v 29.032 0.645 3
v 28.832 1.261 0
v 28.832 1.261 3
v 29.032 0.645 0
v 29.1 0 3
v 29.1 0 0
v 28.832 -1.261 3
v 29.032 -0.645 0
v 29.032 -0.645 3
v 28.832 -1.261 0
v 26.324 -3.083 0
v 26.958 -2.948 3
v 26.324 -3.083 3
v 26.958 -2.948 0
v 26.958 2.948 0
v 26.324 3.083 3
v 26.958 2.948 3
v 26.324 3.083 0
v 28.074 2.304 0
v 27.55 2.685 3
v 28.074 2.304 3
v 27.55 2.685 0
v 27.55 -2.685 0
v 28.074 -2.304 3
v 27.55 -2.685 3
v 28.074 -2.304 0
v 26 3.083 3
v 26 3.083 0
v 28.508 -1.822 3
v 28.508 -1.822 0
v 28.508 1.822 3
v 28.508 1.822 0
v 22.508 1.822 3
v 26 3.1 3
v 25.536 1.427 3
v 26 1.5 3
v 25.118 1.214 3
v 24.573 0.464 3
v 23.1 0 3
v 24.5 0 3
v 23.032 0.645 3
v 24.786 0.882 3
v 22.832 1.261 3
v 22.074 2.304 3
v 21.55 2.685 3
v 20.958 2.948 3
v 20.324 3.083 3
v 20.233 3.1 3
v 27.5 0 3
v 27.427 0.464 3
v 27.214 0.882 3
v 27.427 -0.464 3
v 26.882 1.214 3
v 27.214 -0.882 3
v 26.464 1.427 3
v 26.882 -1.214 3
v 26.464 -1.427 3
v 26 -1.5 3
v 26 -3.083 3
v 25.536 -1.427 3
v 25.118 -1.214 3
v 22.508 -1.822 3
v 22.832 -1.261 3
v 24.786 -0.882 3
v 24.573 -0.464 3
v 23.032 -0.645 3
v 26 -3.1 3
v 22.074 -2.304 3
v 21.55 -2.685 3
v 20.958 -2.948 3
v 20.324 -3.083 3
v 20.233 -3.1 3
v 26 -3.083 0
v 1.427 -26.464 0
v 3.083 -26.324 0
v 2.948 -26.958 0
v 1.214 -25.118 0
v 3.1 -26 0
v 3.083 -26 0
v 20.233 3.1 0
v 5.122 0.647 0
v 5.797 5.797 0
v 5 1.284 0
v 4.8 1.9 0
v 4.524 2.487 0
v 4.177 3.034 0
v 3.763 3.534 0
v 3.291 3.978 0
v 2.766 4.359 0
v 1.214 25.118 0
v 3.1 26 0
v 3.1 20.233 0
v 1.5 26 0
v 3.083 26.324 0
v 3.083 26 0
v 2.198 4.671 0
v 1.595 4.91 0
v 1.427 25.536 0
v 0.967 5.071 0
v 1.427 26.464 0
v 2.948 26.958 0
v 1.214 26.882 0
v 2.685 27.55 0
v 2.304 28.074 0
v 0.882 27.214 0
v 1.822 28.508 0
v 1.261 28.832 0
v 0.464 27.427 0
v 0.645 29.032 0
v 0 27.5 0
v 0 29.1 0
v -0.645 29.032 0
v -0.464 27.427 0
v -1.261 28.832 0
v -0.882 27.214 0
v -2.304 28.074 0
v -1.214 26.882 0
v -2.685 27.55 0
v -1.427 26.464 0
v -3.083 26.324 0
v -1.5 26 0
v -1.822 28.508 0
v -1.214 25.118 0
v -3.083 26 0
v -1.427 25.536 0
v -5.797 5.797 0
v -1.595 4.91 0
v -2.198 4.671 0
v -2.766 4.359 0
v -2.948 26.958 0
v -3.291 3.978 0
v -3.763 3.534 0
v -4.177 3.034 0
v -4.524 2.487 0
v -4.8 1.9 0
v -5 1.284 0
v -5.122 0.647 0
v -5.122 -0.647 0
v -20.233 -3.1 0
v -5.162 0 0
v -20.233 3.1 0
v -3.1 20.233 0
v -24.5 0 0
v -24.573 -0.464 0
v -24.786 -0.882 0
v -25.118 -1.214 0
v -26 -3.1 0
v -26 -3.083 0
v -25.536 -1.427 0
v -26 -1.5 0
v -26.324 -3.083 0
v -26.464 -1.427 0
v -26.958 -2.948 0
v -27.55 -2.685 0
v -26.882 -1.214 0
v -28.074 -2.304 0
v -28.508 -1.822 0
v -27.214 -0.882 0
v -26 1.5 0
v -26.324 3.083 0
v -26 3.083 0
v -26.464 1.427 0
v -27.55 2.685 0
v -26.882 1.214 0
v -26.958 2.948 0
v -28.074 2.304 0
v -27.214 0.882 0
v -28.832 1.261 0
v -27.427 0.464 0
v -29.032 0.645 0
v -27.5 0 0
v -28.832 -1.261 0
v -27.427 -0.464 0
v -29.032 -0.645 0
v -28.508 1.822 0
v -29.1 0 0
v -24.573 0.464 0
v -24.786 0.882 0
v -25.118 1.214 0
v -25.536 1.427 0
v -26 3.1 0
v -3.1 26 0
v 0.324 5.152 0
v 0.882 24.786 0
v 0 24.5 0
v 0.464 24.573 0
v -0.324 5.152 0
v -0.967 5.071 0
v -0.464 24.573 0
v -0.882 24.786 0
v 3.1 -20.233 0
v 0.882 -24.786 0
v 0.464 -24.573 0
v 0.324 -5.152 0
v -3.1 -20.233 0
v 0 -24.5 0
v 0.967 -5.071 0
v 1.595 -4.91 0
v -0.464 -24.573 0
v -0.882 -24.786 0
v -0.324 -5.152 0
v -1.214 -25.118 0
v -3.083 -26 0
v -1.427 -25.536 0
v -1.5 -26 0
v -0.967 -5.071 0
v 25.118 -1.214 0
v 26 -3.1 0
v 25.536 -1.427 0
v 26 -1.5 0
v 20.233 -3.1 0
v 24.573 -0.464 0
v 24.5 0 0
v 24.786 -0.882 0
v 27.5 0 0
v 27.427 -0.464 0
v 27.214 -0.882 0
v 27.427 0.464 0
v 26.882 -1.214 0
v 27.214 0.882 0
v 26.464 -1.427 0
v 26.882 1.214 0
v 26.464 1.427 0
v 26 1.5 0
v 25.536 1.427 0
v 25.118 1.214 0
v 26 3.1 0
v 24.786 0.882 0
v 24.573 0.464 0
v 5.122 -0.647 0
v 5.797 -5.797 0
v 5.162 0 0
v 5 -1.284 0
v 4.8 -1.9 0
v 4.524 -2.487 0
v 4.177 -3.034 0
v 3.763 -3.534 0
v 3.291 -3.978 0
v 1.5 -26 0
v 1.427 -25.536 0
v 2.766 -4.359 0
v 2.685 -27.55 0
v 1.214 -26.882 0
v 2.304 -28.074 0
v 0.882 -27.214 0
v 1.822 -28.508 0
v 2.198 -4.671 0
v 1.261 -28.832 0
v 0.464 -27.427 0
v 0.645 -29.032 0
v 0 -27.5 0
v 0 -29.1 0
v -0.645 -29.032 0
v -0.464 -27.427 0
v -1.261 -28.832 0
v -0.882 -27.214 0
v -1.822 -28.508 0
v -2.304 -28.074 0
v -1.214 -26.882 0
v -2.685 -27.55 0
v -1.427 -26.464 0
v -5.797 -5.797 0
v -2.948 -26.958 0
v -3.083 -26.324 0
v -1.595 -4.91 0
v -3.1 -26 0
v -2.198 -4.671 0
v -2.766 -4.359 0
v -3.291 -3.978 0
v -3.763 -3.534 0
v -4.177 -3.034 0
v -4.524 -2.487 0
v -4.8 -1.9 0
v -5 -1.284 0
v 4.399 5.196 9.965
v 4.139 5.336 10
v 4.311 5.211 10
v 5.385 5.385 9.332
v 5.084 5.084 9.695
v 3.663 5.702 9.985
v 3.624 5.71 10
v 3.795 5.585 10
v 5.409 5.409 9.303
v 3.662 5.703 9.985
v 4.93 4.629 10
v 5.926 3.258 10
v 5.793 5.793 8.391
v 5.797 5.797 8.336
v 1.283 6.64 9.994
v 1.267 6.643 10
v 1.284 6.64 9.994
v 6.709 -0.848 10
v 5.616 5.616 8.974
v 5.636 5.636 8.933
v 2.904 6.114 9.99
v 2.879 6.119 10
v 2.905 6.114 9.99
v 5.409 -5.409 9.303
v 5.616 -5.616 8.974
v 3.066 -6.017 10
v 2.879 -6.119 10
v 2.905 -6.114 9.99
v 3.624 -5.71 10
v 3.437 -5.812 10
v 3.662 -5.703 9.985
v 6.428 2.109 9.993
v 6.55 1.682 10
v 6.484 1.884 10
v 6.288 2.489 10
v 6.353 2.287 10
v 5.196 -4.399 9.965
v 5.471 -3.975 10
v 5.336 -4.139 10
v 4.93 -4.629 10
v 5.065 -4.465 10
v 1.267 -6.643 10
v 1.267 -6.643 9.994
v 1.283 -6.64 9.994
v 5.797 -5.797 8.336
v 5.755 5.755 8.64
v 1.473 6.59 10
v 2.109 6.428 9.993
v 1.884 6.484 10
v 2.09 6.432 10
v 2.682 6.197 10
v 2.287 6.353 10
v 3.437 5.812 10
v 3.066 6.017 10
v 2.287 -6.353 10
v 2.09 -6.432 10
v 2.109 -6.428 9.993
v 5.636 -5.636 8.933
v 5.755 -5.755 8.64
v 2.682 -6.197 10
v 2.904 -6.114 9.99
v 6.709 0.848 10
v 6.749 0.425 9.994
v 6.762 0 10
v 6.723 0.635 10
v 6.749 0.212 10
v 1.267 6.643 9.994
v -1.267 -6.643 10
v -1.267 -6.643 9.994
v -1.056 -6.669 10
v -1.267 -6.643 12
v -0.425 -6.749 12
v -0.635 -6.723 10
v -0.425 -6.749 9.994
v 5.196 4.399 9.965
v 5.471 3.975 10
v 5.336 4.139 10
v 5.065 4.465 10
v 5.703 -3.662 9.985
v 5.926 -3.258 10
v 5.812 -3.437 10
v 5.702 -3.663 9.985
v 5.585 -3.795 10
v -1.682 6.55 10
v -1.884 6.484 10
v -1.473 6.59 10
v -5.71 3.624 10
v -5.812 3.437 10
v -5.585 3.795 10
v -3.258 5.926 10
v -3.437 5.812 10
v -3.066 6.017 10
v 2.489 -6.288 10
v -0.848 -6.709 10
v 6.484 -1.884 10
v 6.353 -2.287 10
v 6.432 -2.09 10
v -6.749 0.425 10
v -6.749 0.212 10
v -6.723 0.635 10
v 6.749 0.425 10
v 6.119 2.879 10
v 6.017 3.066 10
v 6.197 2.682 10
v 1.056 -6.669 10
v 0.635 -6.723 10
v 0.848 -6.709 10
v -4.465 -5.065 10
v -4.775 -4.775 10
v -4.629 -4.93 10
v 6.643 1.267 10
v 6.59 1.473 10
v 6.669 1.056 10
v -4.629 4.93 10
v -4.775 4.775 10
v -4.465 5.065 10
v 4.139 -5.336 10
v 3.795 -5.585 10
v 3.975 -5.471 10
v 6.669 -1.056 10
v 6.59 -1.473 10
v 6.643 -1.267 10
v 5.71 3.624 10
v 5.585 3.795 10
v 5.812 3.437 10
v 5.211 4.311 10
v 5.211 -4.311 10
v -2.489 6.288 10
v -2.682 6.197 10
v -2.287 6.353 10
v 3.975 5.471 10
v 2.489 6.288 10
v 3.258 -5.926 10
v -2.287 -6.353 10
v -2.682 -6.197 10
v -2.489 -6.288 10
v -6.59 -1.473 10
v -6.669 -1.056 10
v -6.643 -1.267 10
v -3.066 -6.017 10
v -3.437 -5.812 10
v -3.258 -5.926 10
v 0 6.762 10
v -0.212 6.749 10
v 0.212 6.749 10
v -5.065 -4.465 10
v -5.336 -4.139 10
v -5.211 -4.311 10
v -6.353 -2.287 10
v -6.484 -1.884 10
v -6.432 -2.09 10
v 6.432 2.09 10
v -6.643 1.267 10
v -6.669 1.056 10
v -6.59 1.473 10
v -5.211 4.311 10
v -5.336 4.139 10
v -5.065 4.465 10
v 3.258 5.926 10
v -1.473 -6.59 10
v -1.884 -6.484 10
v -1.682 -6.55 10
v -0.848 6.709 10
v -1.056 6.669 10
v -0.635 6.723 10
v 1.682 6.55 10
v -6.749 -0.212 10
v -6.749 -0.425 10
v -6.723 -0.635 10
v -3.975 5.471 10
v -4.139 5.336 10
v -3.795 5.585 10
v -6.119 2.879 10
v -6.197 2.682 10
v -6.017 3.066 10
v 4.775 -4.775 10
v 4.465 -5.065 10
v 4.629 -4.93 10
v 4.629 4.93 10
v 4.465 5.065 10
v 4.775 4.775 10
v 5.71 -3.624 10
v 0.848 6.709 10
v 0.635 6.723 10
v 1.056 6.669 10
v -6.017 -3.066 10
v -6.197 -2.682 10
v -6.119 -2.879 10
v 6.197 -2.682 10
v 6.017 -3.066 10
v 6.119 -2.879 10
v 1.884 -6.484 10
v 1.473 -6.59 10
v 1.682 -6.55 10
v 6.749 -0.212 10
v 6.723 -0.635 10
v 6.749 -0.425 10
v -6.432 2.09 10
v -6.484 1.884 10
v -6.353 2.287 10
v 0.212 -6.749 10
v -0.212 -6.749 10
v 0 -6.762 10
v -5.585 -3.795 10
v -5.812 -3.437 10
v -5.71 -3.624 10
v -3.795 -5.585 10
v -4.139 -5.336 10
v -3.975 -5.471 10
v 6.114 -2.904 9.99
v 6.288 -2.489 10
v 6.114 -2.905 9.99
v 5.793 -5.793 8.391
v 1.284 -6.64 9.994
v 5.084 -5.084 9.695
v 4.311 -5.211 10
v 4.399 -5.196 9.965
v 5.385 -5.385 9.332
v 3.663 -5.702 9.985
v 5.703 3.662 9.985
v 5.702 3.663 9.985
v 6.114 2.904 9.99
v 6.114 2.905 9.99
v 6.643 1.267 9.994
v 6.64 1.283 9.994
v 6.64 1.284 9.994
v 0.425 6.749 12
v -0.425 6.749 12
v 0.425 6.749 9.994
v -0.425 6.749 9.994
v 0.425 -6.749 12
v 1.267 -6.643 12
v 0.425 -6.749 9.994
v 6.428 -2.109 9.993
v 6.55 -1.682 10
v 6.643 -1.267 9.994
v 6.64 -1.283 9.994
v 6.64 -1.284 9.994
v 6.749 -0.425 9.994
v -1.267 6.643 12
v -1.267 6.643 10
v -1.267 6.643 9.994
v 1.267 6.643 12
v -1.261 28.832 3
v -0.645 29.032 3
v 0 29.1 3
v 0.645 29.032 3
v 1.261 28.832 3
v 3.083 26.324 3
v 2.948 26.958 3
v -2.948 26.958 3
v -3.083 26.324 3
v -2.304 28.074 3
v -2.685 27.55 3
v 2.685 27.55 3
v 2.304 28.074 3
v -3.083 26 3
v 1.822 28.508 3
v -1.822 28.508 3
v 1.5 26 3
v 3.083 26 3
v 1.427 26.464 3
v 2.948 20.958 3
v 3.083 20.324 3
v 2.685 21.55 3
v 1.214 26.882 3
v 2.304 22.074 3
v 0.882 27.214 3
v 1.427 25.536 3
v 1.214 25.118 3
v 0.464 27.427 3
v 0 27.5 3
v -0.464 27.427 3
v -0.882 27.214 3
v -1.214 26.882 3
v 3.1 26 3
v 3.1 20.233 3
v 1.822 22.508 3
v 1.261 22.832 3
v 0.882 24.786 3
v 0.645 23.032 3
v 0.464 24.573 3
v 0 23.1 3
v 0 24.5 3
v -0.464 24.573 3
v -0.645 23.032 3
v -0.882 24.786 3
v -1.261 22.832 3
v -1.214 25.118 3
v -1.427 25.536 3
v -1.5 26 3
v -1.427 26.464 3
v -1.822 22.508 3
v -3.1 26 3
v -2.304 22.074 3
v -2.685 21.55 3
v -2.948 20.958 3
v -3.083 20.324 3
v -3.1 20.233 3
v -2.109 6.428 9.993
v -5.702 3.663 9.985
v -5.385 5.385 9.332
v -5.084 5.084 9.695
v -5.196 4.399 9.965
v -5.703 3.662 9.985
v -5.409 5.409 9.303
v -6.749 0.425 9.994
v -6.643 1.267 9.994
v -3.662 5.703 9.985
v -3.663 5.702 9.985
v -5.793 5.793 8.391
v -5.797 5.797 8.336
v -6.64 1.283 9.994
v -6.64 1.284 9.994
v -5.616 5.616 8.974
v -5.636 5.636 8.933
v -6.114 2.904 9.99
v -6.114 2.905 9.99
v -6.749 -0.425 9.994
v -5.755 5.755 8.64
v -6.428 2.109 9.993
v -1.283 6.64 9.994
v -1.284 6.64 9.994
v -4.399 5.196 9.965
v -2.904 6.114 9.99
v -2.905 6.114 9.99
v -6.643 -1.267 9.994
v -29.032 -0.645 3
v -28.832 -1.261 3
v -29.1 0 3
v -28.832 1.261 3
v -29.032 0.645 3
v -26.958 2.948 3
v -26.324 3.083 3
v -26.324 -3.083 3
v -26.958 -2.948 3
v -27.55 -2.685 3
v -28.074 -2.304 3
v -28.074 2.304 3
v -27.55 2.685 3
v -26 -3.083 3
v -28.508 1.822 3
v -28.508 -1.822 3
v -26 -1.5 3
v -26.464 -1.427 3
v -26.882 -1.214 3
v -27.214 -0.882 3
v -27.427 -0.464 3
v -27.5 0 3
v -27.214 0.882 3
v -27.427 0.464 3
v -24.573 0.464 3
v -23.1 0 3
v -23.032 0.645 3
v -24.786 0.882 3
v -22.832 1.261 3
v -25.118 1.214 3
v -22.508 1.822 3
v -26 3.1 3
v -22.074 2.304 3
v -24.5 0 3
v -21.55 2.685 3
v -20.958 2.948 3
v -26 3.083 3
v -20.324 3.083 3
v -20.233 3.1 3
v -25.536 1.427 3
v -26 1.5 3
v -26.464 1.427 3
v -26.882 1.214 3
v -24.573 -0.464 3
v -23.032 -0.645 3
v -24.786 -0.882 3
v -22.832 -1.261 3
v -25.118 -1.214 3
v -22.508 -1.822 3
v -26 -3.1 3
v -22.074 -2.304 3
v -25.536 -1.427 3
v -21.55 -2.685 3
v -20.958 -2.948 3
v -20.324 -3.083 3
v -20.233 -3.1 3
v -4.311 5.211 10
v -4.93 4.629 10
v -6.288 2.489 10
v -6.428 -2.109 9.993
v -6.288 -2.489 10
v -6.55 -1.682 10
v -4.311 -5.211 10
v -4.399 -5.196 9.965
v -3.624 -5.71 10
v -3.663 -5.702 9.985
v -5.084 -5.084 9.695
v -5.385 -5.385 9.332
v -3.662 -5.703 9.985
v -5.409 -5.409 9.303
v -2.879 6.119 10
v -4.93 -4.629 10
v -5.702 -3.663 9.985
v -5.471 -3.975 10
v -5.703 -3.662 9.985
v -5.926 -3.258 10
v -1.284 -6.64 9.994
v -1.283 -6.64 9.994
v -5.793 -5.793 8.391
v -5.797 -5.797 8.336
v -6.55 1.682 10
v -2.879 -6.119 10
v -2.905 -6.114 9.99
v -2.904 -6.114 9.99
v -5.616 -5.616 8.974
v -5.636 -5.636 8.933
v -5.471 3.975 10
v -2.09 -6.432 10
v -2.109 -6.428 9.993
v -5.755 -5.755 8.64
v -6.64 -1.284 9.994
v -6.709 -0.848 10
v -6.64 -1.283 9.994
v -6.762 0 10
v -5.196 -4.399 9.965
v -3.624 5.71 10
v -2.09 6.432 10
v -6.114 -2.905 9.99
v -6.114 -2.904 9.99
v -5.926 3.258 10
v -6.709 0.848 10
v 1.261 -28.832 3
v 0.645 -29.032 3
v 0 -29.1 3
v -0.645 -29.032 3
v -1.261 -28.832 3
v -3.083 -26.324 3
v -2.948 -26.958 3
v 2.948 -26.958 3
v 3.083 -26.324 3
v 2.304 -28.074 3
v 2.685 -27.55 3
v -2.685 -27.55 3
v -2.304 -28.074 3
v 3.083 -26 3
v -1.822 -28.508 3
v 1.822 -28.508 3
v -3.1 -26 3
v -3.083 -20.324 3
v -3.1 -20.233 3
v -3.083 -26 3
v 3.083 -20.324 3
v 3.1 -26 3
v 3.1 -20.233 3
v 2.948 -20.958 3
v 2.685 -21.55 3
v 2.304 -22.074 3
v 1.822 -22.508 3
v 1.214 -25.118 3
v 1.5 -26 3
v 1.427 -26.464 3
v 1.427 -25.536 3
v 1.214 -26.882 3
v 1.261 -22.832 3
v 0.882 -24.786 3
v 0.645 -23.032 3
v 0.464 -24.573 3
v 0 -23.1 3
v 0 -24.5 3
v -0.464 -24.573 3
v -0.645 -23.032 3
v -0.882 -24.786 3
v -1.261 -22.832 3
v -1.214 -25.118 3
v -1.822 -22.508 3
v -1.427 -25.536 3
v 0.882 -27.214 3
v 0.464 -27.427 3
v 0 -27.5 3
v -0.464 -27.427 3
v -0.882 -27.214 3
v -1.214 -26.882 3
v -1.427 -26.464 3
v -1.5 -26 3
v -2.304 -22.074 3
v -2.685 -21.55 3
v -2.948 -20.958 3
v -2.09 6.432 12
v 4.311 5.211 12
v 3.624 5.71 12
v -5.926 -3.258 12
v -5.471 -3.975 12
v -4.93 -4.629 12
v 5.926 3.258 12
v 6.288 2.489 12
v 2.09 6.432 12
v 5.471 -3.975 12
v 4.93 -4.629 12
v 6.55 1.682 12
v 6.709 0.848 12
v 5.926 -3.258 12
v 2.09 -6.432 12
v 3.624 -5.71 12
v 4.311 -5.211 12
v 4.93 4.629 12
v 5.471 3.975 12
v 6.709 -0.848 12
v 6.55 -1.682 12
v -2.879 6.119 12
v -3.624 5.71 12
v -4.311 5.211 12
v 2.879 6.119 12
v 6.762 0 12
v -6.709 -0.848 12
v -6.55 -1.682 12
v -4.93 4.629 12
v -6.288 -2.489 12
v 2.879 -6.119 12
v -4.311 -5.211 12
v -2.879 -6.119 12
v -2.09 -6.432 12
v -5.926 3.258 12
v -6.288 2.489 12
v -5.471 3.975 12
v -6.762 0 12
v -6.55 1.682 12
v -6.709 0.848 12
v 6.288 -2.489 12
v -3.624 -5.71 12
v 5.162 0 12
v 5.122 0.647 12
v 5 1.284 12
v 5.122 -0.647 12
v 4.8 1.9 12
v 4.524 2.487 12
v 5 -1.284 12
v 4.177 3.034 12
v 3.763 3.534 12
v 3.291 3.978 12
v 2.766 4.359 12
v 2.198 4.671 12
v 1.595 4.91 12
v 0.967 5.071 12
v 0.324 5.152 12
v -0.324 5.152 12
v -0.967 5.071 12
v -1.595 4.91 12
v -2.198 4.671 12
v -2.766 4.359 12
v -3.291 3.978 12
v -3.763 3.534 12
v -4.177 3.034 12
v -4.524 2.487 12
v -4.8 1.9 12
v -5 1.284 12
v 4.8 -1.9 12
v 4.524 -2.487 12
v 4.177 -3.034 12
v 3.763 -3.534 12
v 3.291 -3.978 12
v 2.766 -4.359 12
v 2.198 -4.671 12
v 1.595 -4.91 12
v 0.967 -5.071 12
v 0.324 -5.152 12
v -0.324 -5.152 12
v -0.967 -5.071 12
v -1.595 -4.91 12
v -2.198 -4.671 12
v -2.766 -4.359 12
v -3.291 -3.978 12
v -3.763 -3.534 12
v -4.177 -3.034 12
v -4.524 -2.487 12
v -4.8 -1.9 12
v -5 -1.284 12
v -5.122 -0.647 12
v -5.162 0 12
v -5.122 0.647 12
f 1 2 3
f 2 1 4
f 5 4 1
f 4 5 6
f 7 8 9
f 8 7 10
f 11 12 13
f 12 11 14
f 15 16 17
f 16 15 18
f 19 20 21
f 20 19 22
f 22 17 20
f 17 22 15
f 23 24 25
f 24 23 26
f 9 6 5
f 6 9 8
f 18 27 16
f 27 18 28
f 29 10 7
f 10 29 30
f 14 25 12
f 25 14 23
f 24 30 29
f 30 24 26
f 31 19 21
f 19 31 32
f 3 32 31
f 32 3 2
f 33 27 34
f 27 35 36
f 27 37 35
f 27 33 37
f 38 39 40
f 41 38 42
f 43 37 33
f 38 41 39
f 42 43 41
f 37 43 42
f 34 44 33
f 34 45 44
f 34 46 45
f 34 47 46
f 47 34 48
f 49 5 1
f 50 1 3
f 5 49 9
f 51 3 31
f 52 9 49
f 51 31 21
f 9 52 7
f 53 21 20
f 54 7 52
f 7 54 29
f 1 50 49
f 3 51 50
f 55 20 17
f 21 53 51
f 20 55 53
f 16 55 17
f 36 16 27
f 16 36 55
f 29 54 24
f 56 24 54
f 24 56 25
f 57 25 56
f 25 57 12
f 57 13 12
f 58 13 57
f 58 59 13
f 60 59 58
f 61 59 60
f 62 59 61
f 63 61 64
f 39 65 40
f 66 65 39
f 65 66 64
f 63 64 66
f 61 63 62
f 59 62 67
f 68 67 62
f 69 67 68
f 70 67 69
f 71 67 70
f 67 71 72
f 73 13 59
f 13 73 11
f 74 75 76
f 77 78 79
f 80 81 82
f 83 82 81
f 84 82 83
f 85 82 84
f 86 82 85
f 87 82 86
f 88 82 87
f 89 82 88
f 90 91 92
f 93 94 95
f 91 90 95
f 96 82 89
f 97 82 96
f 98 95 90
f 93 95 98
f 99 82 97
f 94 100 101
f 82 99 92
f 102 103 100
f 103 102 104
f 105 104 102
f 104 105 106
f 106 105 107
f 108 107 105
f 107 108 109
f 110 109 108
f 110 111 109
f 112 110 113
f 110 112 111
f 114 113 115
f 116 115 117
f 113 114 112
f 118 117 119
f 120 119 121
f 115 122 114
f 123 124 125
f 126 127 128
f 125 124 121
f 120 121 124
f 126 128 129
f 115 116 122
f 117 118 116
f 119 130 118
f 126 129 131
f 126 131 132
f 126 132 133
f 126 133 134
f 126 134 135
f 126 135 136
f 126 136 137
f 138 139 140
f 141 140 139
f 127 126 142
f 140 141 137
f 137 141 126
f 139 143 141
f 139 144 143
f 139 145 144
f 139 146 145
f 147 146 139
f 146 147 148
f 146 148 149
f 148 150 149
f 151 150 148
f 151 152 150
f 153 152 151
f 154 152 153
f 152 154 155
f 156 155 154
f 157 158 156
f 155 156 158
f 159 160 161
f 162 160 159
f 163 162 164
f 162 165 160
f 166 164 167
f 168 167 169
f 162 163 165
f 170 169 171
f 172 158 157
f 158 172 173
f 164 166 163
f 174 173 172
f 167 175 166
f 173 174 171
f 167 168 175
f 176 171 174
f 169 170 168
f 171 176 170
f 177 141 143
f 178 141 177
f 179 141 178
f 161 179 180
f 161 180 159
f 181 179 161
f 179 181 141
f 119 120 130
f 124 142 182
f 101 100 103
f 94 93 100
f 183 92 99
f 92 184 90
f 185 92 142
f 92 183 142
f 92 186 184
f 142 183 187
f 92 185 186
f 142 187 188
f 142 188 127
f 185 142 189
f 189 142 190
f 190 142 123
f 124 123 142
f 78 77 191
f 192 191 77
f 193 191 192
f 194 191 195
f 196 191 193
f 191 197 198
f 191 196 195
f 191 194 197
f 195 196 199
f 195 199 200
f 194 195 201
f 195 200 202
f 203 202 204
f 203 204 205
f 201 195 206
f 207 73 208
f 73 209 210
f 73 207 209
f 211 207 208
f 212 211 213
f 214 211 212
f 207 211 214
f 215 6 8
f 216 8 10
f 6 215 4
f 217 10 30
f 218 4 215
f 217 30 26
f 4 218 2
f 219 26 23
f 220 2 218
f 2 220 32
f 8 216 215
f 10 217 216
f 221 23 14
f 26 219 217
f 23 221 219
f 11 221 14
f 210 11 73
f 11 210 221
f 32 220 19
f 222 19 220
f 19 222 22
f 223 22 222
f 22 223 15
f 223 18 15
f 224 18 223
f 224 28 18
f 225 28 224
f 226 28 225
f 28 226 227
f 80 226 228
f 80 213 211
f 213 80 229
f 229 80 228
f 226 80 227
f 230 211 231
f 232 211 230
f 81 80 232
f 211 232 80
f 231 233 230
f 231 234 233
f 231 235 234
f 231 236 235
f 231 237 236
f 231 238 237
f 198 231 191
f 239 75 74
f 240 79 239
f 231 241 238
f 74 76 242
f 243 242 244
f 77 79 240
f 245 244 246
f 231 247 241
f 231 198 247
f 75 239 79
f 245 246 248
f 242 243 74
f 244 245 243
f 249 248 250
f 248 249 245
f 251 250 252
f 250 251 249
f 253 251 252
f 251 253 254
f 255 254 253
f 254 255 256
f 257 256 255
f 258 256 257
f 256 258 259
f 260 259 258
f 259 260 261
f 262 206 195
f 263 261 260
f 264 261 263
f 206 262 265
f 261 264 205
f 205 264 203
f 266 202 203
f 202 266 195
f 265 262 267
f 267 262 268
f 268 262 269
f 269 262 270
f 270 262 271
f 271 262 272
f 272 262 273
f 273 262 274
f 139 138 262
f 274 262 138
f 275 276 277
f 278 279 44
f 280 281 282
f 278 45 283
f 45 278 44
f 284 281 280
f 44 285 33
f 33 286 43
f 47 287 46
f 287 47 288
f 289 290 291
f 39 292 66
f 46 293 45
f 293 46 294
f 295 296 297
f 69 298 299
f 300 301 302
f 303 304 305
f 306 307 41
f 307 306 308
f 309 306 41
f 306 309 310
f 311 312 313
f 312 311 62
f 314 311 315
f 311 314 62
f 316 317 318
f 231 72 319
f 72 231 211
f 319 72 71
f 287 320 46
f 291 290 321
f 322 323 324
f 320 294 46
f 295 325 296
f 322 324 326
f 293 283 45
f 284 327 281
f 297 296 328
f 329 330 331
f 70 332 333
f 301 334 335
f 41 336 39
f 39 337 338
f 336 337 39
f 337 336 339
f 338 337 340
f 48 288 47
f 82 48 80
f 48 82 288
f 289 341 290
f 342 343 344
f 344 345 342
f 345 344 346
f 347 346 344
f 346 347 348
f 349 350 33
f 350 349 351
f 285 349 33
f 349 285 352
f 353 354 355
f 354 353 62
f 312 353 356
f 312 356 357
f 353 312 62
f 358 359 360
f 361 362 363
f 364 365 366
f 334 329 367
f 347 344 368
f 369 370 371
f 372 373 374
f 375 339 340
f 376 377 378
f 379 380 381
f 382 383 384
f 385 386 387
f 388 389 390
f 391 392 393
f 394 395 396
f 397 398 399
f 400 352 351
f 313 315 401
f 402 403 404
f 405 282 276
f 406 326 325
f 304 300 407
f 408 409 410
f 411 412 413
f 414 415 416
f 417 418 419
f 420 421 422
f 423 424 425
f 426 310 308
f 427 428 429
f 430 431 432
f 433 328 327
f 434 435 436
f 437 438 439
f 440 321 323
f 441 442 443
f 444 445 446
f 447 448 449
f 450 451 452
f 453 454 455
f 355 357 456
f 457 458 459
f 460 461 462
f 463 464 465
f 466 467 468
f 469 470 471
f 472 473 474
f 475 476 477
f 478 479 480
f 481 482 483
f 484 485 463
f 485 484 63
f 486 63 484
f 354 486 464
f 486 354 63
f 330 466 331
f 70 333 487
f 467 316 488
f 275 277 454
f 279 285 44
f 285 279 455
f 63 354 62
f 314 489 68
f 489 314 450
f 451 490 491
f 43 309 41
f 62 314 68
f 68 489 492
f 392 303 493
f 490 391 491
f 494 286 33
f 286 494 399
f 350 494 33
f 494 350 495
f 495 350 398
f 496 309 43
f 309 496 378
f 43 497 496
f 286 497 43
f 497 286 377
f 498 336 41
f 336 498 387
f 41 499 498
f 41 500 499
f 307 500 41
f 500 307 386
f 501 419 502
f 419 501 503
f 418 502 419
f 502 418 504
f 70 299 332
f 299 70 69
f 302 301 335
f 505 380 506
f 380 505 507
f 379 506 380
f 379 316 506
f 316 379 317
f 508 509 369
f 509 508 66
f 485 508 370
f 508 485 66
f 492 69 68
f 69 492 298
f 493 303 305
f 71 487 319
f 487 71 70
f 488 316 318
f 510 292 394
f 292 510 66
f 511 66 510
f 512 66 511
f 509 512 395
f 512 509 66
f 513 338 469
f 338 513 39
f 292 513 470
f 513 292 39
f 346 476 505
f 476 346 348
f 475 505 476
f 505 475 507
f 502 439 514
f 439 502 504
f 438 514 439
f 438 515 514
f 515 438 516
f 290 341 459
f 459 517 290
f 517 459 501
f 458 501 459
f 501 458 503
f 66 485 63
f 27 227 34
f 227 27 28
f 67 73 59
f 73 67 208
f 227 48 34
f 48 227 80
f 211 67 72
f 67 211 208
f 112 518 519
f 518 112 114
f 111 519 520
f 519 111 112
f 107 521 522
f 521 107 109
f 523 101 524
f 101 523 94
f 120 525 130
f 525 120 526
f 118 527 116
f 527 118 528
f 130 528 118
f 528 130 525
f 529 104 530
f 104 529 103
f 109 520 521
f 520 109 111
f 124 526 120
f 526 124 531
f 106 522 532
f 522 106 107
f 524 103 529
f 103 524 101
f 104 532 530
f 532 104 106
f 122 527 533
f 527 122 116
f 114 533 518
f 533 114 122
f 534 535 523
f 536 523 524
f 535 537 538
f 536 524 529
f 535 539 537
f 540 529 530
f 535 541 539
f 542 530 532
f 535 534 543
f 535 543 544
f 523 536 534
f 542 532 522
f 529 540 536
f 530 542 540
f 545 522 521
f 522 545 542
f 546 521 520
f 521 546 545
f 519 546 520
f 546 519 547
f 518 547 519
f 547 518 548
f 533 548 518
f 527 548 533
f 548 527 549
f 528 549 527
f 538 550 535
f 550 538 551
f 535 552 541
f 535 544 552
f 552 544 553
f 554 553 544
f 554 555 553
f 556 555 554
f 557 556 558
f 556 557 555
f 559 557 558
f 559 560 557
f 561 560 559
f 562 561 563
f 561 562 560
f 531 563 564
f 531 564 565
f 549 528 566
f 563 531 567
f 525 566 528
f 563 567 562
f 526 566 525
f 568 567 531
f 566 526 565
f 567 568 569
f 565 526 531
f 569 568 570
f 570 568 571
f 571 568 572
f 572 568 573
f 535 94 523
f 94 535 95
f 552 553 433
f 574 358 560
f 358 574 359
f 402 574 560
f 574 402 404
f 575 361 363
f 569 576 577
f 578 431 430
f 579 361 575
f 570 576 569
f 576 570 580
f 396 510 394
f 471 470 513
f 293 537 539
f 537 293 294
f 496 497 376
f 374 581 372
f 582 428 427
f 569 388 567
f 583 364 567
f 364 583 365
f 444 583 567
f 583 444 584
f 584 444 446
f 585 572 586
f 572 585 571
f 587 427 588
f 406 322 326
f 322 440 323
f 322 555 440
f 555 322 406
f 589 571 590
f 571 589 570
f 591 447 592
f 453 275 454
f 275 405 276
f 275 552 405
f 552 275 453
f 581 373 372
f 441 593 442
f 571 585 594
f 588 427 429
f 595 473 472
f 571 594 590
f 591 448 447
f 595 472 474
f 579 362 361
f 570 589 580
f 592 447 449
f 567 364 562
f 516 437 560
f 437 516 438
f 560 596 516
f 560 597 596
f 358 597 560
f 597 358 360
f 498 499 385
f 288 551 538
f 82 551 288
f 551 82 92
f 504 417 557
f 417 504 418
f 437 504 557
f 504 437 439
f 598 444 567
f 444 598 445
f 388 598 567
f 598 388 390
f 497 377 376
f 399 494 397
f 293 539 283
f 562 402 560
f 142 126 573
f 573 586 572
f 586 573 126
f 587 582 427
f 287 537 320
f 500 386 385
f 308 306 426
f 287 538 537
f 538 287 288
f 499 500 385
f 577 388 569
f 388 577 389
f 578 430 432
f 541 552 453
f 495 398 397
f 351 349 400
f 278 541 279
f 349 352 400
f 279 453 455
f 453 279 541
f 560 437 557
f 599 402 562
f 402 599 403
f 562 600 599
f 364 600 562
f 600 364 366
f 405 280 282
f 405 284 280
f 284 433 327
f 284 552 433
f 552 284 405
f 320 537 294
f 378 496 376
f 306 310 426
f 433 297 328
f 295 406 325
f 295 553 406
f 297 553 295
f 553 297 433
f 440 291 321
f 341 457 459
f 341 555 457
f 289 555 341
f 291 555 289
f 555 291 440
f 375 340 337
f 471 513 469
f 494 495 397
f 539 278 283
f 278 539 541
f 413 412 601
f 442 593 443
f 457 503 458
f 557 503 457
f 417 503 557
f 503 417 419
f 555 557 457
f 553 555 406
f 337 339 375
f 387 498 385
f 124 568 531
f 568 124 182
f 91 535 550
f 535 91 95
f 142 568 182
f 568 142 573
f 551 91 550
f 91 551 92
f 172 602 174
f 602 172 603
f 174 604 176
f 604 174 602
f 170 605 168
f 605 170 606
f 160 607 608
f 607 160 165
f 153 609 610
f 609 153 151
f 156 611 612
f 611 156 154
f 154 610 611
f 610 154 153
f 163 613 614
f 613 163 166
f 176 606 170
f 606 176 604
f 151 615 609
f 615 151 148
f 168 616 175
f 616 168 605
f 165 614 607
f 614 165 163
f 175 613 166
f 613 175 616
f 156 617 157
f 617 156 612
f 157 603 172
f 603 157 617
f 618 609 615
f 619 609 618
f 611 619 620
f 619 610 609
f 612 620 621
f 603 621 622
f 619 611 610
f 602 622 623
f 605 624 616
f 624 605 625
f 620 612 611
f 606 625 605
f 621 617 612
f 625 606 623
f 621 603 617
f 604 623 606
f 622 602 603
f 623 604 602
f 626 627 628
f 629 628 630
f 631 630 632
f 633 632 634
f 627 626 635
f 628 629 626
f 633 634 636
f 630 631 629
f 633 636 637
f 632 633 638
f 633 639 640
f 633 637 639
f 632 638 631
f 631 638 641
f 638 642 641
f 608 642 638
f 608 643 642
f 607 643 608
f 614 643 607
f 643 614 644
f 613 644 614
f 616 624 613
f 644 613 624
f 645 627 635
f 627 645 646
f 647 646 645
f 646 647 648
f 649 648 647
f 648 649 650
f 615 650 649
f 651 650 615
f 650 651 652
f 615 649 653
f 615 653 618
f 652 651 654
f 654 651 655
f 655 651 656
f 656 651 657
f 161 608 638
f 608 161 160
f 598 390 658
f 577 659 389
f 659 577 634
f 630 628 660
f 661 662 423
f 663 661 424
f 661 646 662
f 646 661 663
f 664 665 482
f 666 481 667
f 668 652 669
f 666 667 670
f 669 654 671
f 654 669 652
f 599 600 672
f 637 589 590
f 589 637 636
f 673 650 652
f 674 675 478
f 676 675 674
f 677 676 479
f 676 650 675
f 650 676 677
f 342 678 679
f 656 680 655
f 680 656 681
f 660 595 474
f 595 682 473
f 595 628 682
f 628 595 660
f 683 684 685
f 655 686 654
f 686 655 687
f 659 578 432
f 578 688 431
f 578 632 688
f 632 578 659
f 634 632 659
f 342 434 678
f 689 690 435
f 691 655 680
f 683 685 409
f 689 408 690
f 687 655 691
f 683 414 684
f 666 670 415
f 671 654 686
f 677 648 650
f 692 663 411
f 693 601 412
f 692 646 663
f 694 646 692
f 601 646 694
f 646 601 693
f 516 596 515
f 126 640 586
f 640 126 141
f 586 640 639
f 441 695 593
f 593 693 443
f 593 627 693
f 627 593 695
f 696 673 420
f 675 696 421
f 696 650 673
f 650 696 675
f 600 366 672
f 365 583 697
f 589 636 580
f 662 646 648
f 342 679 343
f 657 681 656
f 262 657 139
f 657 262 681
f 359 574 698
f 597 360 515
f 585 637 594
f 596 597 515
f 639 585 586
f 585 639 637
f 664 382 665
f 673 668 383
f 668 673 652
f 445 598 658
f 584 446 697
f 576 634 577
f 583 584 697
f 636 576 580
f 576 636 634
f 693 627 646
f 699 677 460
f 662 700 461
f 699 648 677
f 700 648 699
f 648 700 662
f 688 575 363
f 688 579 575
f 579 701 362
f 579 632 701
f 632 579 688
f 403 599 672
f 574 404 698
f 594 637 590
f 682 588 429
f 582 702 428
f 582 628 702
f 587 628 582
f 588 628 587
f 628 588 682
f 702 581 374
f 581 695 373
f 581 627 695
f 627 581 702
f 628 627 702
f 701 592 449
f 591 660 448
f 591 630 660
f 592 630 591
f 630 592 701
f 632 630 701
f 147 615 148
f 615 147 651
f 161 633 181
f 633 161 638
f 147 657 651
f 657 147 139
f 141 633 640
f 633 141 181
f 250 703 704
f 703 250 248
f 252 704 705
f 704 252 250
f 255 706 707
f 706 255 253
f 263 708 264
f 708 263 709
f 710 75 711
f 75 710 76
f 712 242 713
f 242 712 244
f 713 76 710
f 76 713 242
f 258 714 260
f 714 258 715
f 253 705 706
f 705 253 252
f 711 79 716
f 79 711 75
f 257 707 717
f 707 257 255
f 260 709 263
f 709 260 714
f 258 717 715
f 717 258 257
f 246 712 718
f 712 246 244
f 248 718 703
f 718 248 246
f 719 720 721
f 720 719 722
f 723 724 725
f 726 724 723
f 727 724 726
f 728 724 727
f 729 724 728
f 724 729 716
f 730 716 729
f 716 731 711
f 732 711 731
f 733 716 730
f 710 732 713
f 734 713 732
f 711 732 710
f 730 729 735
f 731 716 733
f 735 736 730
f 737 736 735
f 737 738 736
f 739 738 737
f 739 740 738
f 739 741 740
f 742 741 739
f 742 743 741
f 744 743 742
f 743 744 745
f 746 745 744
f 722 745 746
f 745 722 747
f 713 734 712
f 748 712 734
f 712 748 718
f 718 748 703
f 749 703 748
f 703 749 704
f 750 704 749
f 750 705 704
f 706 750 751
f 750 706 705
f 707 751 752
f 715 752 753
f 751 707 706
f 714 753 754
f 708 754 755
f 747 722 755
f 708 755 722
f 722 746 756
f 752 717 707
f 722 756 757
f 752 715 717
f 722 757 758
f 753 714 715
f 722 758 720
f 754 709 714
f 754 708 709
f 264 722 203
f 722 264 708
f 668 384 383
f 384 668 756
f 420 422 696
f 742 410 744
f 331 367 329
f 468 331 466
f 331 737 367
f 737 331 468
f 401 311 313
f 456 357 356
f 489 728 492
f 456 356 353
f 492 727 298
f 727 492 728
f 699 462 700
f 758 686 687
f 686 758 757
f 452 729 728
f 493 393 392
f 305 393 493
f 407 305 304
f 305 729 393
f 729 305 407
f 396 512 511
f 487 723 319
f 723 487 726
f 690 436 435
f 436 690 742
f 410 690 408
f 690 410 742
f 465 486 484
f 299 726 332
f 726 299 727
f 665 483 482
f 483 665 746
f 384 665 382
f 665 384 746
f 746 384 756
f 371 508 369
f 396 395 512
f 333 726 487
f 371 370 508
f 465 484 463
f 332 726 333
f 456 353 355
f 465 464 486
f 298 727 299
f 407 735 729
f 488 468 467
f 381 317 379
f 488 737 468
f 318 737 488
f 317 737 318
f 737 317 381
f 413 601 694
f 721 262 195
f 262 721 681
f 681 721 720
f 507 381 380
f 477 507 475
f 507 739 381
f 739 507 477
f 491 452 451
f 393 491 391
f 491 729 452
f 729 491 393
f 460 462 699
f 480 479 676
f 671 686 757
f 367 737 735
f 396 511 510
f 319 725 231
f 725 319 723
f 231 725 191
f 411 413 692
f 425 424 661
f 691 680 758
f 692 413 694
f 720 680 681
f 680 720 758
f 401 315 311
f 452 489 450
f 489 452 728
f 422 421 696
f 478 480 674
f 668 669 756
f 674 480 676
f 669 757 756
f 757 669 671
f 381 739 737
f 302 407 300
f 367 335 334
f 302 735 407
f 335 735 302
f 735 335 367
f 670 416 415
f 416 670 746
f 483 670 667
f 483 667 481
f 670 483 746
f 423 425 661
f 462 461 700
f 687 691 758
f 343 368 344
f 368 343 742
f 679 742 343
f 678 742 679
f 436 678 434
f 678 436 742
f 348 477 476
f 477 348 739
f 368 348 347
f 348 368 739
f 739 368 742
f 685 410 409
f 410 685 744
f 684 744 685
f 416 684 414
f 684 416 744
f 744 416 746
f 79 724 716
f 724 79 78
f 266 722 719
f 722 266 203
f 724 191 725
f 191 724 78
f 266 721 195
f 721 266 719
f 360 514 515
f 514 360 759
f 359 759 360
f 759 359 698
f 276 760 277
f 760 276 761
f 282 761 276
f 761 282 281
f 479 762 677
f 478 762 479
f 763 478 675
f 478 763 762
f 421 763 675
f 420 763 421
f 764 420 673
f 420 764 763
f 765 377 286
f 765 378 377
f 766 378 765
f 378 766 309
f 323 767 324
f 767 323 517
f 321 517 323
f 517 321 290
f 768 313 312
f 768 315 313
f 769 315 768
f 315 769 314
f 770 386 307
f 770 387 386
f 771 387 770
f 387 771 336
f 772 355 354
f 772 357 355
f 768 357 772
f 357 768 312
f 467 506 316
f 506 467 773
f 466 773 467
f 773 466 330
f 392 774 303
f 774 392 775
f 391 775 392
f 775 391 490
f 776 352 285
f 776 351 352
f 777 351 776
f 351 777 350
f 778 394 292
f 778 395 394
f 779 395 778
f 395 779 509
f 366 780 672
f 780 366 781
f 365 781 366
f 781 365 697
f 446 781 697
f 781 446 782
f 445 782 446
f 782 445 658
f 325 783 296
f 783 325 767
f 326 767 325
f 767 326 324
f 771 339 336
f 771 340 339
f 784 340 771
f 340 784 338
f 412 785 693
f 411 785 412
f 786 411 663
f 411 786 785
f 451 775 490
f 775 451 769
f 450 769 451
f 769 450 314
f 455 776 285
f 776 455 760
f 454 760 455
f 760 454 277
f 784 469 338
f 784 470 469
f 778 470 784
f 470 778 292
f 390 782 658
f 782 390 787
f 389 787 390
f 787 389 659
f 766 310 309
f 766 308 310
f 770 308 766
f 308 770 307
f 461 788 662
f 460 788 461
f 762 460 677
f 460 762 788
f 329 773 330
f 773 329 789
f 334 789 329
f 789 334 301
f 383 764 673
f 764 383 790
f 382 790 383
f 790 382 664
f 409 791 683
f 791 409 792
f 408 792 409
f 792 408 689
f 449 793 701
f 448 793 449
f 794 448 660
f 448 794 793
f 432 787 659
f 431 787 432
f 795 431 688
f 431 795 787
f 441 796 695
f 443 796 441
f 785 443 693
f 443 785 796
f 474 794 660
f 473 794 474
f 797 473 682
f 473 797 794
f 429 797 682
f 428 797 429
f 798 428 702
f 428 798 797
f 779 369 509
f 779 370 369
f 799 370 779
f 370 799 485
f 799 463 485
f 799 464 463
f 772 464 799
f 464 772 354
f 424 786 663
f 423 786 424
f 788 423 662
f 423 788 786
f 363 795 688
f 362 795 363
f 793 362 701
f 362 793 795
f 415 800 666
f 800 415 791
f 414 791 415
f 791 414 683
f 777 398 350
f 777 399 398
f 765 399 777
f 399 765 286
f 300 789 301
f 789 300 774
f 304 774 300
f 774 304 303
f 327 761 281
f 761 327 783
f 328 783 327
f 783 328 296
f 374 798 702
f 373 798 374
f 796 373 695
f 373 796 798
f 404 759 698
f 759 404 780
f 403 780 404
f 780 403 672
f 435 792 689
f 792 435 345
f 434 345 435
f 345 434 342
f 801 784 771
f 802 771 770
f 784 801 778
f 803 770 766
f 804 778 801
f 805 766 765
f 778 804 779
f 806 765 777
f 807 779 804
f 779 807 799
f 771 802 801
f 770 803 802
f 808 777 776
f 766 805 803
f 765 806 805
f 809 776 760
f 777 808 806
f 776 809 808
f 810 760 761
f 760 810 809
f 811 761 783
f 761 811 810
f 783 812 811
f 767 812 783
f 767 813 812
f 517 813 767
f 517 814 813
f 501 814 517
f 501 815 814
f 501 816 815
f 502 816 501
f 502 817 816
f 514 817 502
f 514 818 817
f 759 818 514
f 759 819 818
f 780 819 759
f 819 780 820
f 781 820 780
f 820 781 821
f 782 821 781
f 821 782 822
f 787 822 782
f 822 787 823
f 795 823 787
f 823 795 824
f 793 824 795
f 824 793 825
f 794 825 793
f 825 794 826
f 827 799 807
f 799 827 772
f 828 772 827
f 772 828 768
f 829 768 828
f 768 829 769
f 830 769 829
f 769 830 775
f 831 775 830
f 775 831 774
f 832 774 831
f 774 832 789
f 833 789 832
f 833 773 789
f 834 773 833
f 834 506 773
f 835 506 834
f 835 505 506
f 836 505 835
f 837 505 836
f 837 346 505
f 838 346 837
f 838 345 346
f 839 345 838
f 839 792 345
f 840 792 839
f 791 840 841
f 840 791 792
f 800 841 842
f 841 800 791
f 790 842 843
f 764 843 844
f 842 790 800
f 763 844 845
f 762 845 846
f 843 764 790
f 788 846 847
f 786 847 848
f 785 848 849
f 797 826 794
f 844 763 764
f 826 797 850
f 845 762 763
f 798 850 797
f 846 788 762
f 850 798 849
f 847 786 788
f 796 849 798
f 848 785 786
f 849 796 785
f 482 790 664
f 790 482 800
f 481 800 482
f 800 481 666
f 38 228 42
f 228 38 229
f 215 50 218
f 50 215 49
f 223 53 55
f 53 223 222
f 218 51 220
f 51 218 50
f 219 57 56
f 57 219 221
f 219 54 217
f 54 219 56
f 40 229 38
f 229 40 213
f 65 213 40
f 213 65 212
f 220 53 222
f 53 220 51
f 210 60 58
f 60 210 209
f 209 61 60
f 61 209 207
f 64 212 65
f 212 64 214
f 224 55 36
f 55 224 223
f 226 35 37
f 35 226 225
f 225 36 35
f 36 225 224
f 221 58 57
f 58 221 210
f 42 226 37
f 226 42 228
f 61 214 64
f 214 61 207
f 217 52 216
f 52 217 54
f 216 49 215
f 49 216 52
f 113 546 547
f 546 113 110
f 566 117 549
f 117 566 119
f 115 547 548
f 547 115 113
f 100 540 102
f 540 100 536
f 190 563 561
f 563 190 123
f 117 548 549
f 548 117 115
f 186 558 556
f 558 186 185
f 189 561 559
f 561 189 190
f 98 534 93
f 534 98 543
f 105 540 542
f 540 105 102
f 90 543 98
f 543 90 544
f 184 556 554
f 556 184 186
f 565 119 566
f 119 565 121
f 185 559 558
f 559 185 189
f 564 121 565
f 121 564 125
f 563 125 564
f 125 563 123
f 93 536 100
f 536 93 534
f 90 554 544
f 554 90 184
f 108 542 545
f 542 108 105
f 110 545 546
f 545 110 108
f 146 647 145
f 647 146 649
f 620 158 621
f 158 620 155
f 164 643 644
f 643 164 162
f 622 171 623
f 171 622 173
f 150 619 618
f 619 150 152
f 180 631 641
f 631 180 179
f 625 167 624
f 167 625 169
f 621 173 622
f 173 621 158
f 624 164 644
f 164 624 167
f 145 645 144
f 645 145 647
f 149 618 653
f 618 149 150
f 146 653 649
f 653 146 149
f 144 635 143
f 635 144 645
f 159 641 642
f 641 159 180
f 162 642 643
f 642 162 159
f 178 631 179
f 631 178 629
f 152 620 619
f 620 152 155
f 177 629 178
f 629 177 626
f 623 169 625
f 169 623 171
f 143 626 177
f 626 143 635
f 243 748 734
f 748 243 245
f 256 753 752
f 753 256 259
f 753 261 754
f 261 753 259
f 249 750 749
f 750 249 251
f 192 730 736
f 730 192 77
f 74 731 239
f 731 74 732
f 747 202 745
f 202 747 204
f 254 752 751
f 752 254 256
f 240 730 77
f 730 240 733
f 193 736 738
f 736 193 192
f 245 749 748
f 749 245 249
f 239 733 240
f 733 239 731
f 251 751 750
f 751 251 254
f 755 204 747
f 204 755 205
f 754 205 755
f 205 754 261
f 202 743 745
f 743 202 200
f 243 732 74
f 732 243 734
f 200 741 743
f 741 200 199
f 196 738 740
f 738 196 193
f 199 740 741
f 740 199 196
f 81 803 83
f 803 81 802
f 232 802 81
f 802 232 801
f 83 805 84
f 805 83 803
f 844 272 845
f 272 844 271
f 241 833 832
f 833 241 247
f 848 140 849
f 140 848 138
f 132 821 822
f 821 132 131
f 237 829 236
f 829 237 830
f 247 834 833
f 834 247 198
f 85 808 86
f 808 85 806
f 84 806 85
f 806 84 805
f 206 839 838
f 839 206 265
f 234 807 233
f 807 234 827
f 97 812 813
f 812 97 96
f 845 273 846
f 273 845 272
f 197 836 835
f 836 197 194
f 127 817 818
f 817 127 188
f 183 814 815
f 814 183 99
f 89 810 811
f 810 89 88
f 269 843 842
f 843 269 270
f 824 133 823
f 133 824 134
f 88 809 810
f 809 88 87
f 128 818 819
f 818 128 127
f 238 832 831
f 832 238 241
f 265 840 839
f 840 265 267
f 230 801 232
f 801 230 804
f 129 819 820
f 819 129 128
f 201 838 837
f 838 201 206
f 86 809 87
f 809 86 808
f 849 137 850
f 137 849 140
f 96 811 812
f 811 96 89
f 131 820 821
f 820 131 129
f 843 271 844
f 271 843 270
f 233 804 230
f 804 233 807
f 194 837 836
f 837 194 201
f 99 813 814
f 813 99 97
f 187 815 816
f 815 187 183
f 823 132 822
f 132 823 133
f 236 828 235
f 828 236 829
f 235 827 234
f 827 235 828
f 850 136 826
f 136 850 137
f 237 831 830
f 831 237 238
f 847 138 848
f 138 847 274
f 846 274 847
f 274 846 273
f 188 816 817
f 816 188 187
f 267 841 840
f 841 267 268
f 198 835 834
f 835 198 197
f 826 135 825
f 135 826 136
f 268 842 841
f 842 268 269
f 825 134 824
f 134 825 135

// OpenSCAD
part="neck";
thick=1.6;
centerd=25.4*(3/8)+.8;
neckh=12;
necklip=0;
if(part=="base"||part=="all")
  color(part=="all"?"blue":undef) base();
if(part=="all"||part=="neck")
  translate([0,0,part=="all"?12.7:0])
    neck();
module neck() {
  difference() {
    union() {
      cylinder(d=centerd+thick*2,h=neckh,$fn=50);
      for(r=[0:90:359]) rotate([0,0,r]) {
        translate([26,0]) cylinder(d=3+thick*2,h=3,$fn=30);
        hull() {
          cylinder(d=centerd+thick*2,h=neckh-2,$fn=50);
          translate([20,0]) cylinder(d=3+thick*2,h=3,$fn=30);
        }
          translate([20,-1.5-thick]) cube([6,3+thick*2,3]);
      }
    }
    translate([0,0,-.01]) difference() {
      cylinder(d=centerd,h=20,$fn=50);
      if(necklip)
      {
        difference() { cylinder(d=centerd,h=necklip,$fn=50); translate([0,0,-.01]) cylinder(d=centerd-necklip,h=necklip+.02,$fn=50); }
      }
    }
    for(r=[0:90:359]) rotate([0,0,r]) translate([26,0,-.01]) cylinder(d=3,h=3.02,$fn=20);
  }
}
module base() {
linear_extrude(12.7) {
  difference() {
    union() {
      circle(d=50,$fn=100);
      for(r=[0:90:359]) rotate([0,0,r]) translate([26,0]) {
        cd=3+thick*2;
        circle(d=cd,$fn=30);
        translate([cd/-2,cd/-2]) square([cd/2,cd]);
      }
    }
    circle(d=50-thick*2,$fn=100);
    for(r=[0:90:359]) rotate([0,0,r]) translate([26,0]) circle(d=3,$fn=20);
  }
}
}
